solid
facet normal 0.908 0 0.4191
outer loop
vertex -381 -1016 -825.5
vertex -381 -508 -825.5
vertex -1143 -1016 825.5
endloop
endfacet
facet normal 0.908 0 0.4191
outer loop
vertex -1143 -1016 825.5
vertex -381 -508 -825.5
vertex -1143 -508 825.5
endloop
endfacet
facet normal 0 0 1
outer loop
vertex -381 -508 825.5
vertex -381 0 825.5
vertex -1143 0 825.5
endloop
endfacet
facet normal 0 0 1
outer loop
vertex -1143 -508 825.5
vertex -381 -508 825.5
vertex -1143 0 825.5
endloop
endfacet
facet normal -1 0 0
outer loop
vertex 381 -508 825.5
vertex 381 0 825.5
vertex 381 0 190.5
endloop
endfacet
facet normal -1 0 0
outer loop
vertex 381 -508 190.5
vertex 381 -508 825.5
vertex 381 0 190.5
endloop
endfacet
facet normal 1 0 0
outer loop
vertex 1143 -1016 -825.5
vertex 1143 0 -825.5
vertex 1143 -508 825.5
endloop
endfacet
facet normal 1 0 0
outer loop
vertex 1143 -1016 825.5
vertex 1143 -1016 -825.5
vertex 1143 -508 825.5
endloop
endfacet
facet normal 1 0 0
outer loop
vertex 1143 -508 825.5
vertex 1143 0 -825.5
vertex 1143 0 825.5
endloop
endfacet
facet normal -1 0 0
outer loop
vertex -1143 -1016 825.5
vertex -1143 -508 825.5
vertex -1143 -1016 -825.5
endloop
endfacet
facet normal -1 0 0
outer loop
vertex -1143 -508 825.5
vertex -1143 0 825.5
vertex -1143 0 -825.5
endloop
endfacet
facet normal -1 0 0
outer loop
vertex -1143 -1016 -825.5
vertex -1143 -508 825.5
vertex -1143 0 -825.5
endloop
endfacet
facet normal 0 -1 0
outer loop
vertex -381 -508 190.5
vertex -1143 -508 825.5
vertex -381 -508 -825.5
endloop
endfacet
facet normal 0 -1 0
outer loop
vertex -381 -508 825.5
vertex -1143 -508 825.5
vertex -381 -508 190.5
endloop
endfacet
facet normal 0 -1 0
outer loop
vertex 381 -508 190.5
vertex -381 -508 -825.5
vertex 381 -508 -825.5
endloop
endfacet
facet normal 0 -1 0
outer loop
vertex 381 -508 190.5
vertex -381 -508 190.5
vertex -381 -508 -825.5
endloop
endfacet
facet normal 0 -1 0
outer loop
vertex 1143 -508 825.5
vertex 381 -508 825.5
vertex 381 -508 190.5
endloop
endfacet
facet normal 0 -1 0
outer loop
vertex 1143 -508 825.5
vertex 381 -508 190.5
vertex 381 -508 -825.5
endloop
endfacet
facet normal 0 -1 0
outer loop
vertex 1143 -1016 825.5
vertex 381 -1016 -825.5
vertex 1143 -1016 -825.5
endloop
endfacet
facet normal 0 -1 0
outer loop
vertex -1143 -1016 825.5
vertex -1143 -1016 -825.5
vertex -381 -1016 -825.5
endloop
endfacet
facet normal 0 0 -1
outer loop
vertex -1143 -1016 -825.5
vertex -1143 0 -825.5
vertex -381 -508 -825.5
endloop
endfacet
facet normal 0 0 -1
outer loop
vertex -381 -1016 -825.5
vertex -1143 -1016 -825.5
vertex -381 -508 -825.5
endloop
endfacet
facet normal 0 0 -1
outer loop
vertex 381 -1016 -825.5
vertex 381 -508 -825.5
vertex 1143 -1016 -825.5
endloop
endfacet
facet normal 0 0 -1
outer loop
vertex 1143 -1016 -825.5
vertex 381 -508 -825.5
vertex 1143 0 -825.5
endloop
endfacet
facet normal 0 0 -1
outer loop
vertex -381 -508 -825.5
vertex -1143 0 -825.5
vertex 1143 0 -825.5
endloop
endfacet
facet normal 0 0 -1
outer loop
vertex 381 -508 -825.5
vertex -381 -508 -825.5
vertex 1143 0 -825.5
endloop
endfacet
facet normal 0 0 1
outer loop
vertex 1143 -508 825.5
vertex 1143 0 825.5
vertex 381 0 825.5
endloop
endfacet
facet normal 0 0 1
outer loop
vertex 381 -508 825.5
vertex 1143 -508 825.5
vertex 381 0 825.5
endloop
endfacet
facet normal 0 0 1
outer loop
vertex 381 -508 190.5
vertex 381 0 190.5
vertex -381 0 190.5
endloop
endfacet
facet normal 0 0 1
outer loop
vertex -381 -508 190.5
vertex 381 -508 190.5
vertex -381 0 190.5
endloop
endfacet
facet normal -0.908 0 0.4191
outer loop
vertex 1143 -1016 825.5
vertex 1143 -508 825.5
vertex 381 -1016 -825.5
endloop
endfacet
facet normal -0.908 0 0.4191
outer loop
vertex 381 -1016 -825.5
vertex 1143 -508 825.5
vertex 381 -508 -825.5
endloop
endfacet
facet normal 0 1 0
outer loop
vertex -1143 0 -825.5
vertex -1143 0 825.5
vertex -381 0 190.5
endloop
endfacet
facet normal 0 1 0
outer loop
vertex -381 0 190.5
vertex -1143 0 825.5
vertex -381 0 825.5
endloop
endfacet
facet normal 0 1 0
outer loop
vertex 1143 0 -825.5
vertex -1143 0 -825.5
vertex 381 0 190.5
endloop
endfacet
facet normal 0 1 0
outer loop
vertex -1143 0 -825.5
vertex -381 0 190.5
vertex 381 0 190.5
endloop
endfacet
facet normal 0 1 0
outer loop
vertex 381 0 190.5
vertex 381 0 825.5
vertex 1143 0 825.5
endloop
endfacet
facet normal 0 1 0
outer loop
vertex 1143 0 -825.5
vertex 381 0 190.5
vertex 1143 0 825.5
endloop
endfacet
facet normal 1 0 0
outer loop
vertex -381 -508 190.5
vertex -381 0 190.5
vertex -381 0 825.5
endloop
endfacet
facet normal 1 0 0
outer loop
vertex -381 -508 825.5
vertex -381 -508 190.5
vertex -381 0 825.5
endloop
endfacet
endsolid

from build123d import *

# Parameters (mm, degrees)
F1_DEPTH = 508
F3_DEPTH = 508


with BuildPart() as f1:
    # F0 (on Front) → F1 (new body)
    with BuildSketch(Plane.XZ):
        Polygon((381, -825.5), (1143, -825.5), (1143, 825.5), (381, 825.5), (381, 190.5), (-381, 190.5), (-381, 825.5), (-1143, 825.5), (-1143, -825.5), (-381, -825.5), align=None)
    extrude(amount=F1_DEPTH)

    # F2 (on face) → F3 (join)
    with BuildSketch(Plane.XZ.offset(508)):
        Polygon((-381, -825.5), (-1143, 825.5), (-1143, -825.5), align=None)
        Polygon((1143, -825.5), (1143, 825.5), (381, -825.5), align=None)
    extrude(amount=F3_DEPTH)


solid = f1.part
